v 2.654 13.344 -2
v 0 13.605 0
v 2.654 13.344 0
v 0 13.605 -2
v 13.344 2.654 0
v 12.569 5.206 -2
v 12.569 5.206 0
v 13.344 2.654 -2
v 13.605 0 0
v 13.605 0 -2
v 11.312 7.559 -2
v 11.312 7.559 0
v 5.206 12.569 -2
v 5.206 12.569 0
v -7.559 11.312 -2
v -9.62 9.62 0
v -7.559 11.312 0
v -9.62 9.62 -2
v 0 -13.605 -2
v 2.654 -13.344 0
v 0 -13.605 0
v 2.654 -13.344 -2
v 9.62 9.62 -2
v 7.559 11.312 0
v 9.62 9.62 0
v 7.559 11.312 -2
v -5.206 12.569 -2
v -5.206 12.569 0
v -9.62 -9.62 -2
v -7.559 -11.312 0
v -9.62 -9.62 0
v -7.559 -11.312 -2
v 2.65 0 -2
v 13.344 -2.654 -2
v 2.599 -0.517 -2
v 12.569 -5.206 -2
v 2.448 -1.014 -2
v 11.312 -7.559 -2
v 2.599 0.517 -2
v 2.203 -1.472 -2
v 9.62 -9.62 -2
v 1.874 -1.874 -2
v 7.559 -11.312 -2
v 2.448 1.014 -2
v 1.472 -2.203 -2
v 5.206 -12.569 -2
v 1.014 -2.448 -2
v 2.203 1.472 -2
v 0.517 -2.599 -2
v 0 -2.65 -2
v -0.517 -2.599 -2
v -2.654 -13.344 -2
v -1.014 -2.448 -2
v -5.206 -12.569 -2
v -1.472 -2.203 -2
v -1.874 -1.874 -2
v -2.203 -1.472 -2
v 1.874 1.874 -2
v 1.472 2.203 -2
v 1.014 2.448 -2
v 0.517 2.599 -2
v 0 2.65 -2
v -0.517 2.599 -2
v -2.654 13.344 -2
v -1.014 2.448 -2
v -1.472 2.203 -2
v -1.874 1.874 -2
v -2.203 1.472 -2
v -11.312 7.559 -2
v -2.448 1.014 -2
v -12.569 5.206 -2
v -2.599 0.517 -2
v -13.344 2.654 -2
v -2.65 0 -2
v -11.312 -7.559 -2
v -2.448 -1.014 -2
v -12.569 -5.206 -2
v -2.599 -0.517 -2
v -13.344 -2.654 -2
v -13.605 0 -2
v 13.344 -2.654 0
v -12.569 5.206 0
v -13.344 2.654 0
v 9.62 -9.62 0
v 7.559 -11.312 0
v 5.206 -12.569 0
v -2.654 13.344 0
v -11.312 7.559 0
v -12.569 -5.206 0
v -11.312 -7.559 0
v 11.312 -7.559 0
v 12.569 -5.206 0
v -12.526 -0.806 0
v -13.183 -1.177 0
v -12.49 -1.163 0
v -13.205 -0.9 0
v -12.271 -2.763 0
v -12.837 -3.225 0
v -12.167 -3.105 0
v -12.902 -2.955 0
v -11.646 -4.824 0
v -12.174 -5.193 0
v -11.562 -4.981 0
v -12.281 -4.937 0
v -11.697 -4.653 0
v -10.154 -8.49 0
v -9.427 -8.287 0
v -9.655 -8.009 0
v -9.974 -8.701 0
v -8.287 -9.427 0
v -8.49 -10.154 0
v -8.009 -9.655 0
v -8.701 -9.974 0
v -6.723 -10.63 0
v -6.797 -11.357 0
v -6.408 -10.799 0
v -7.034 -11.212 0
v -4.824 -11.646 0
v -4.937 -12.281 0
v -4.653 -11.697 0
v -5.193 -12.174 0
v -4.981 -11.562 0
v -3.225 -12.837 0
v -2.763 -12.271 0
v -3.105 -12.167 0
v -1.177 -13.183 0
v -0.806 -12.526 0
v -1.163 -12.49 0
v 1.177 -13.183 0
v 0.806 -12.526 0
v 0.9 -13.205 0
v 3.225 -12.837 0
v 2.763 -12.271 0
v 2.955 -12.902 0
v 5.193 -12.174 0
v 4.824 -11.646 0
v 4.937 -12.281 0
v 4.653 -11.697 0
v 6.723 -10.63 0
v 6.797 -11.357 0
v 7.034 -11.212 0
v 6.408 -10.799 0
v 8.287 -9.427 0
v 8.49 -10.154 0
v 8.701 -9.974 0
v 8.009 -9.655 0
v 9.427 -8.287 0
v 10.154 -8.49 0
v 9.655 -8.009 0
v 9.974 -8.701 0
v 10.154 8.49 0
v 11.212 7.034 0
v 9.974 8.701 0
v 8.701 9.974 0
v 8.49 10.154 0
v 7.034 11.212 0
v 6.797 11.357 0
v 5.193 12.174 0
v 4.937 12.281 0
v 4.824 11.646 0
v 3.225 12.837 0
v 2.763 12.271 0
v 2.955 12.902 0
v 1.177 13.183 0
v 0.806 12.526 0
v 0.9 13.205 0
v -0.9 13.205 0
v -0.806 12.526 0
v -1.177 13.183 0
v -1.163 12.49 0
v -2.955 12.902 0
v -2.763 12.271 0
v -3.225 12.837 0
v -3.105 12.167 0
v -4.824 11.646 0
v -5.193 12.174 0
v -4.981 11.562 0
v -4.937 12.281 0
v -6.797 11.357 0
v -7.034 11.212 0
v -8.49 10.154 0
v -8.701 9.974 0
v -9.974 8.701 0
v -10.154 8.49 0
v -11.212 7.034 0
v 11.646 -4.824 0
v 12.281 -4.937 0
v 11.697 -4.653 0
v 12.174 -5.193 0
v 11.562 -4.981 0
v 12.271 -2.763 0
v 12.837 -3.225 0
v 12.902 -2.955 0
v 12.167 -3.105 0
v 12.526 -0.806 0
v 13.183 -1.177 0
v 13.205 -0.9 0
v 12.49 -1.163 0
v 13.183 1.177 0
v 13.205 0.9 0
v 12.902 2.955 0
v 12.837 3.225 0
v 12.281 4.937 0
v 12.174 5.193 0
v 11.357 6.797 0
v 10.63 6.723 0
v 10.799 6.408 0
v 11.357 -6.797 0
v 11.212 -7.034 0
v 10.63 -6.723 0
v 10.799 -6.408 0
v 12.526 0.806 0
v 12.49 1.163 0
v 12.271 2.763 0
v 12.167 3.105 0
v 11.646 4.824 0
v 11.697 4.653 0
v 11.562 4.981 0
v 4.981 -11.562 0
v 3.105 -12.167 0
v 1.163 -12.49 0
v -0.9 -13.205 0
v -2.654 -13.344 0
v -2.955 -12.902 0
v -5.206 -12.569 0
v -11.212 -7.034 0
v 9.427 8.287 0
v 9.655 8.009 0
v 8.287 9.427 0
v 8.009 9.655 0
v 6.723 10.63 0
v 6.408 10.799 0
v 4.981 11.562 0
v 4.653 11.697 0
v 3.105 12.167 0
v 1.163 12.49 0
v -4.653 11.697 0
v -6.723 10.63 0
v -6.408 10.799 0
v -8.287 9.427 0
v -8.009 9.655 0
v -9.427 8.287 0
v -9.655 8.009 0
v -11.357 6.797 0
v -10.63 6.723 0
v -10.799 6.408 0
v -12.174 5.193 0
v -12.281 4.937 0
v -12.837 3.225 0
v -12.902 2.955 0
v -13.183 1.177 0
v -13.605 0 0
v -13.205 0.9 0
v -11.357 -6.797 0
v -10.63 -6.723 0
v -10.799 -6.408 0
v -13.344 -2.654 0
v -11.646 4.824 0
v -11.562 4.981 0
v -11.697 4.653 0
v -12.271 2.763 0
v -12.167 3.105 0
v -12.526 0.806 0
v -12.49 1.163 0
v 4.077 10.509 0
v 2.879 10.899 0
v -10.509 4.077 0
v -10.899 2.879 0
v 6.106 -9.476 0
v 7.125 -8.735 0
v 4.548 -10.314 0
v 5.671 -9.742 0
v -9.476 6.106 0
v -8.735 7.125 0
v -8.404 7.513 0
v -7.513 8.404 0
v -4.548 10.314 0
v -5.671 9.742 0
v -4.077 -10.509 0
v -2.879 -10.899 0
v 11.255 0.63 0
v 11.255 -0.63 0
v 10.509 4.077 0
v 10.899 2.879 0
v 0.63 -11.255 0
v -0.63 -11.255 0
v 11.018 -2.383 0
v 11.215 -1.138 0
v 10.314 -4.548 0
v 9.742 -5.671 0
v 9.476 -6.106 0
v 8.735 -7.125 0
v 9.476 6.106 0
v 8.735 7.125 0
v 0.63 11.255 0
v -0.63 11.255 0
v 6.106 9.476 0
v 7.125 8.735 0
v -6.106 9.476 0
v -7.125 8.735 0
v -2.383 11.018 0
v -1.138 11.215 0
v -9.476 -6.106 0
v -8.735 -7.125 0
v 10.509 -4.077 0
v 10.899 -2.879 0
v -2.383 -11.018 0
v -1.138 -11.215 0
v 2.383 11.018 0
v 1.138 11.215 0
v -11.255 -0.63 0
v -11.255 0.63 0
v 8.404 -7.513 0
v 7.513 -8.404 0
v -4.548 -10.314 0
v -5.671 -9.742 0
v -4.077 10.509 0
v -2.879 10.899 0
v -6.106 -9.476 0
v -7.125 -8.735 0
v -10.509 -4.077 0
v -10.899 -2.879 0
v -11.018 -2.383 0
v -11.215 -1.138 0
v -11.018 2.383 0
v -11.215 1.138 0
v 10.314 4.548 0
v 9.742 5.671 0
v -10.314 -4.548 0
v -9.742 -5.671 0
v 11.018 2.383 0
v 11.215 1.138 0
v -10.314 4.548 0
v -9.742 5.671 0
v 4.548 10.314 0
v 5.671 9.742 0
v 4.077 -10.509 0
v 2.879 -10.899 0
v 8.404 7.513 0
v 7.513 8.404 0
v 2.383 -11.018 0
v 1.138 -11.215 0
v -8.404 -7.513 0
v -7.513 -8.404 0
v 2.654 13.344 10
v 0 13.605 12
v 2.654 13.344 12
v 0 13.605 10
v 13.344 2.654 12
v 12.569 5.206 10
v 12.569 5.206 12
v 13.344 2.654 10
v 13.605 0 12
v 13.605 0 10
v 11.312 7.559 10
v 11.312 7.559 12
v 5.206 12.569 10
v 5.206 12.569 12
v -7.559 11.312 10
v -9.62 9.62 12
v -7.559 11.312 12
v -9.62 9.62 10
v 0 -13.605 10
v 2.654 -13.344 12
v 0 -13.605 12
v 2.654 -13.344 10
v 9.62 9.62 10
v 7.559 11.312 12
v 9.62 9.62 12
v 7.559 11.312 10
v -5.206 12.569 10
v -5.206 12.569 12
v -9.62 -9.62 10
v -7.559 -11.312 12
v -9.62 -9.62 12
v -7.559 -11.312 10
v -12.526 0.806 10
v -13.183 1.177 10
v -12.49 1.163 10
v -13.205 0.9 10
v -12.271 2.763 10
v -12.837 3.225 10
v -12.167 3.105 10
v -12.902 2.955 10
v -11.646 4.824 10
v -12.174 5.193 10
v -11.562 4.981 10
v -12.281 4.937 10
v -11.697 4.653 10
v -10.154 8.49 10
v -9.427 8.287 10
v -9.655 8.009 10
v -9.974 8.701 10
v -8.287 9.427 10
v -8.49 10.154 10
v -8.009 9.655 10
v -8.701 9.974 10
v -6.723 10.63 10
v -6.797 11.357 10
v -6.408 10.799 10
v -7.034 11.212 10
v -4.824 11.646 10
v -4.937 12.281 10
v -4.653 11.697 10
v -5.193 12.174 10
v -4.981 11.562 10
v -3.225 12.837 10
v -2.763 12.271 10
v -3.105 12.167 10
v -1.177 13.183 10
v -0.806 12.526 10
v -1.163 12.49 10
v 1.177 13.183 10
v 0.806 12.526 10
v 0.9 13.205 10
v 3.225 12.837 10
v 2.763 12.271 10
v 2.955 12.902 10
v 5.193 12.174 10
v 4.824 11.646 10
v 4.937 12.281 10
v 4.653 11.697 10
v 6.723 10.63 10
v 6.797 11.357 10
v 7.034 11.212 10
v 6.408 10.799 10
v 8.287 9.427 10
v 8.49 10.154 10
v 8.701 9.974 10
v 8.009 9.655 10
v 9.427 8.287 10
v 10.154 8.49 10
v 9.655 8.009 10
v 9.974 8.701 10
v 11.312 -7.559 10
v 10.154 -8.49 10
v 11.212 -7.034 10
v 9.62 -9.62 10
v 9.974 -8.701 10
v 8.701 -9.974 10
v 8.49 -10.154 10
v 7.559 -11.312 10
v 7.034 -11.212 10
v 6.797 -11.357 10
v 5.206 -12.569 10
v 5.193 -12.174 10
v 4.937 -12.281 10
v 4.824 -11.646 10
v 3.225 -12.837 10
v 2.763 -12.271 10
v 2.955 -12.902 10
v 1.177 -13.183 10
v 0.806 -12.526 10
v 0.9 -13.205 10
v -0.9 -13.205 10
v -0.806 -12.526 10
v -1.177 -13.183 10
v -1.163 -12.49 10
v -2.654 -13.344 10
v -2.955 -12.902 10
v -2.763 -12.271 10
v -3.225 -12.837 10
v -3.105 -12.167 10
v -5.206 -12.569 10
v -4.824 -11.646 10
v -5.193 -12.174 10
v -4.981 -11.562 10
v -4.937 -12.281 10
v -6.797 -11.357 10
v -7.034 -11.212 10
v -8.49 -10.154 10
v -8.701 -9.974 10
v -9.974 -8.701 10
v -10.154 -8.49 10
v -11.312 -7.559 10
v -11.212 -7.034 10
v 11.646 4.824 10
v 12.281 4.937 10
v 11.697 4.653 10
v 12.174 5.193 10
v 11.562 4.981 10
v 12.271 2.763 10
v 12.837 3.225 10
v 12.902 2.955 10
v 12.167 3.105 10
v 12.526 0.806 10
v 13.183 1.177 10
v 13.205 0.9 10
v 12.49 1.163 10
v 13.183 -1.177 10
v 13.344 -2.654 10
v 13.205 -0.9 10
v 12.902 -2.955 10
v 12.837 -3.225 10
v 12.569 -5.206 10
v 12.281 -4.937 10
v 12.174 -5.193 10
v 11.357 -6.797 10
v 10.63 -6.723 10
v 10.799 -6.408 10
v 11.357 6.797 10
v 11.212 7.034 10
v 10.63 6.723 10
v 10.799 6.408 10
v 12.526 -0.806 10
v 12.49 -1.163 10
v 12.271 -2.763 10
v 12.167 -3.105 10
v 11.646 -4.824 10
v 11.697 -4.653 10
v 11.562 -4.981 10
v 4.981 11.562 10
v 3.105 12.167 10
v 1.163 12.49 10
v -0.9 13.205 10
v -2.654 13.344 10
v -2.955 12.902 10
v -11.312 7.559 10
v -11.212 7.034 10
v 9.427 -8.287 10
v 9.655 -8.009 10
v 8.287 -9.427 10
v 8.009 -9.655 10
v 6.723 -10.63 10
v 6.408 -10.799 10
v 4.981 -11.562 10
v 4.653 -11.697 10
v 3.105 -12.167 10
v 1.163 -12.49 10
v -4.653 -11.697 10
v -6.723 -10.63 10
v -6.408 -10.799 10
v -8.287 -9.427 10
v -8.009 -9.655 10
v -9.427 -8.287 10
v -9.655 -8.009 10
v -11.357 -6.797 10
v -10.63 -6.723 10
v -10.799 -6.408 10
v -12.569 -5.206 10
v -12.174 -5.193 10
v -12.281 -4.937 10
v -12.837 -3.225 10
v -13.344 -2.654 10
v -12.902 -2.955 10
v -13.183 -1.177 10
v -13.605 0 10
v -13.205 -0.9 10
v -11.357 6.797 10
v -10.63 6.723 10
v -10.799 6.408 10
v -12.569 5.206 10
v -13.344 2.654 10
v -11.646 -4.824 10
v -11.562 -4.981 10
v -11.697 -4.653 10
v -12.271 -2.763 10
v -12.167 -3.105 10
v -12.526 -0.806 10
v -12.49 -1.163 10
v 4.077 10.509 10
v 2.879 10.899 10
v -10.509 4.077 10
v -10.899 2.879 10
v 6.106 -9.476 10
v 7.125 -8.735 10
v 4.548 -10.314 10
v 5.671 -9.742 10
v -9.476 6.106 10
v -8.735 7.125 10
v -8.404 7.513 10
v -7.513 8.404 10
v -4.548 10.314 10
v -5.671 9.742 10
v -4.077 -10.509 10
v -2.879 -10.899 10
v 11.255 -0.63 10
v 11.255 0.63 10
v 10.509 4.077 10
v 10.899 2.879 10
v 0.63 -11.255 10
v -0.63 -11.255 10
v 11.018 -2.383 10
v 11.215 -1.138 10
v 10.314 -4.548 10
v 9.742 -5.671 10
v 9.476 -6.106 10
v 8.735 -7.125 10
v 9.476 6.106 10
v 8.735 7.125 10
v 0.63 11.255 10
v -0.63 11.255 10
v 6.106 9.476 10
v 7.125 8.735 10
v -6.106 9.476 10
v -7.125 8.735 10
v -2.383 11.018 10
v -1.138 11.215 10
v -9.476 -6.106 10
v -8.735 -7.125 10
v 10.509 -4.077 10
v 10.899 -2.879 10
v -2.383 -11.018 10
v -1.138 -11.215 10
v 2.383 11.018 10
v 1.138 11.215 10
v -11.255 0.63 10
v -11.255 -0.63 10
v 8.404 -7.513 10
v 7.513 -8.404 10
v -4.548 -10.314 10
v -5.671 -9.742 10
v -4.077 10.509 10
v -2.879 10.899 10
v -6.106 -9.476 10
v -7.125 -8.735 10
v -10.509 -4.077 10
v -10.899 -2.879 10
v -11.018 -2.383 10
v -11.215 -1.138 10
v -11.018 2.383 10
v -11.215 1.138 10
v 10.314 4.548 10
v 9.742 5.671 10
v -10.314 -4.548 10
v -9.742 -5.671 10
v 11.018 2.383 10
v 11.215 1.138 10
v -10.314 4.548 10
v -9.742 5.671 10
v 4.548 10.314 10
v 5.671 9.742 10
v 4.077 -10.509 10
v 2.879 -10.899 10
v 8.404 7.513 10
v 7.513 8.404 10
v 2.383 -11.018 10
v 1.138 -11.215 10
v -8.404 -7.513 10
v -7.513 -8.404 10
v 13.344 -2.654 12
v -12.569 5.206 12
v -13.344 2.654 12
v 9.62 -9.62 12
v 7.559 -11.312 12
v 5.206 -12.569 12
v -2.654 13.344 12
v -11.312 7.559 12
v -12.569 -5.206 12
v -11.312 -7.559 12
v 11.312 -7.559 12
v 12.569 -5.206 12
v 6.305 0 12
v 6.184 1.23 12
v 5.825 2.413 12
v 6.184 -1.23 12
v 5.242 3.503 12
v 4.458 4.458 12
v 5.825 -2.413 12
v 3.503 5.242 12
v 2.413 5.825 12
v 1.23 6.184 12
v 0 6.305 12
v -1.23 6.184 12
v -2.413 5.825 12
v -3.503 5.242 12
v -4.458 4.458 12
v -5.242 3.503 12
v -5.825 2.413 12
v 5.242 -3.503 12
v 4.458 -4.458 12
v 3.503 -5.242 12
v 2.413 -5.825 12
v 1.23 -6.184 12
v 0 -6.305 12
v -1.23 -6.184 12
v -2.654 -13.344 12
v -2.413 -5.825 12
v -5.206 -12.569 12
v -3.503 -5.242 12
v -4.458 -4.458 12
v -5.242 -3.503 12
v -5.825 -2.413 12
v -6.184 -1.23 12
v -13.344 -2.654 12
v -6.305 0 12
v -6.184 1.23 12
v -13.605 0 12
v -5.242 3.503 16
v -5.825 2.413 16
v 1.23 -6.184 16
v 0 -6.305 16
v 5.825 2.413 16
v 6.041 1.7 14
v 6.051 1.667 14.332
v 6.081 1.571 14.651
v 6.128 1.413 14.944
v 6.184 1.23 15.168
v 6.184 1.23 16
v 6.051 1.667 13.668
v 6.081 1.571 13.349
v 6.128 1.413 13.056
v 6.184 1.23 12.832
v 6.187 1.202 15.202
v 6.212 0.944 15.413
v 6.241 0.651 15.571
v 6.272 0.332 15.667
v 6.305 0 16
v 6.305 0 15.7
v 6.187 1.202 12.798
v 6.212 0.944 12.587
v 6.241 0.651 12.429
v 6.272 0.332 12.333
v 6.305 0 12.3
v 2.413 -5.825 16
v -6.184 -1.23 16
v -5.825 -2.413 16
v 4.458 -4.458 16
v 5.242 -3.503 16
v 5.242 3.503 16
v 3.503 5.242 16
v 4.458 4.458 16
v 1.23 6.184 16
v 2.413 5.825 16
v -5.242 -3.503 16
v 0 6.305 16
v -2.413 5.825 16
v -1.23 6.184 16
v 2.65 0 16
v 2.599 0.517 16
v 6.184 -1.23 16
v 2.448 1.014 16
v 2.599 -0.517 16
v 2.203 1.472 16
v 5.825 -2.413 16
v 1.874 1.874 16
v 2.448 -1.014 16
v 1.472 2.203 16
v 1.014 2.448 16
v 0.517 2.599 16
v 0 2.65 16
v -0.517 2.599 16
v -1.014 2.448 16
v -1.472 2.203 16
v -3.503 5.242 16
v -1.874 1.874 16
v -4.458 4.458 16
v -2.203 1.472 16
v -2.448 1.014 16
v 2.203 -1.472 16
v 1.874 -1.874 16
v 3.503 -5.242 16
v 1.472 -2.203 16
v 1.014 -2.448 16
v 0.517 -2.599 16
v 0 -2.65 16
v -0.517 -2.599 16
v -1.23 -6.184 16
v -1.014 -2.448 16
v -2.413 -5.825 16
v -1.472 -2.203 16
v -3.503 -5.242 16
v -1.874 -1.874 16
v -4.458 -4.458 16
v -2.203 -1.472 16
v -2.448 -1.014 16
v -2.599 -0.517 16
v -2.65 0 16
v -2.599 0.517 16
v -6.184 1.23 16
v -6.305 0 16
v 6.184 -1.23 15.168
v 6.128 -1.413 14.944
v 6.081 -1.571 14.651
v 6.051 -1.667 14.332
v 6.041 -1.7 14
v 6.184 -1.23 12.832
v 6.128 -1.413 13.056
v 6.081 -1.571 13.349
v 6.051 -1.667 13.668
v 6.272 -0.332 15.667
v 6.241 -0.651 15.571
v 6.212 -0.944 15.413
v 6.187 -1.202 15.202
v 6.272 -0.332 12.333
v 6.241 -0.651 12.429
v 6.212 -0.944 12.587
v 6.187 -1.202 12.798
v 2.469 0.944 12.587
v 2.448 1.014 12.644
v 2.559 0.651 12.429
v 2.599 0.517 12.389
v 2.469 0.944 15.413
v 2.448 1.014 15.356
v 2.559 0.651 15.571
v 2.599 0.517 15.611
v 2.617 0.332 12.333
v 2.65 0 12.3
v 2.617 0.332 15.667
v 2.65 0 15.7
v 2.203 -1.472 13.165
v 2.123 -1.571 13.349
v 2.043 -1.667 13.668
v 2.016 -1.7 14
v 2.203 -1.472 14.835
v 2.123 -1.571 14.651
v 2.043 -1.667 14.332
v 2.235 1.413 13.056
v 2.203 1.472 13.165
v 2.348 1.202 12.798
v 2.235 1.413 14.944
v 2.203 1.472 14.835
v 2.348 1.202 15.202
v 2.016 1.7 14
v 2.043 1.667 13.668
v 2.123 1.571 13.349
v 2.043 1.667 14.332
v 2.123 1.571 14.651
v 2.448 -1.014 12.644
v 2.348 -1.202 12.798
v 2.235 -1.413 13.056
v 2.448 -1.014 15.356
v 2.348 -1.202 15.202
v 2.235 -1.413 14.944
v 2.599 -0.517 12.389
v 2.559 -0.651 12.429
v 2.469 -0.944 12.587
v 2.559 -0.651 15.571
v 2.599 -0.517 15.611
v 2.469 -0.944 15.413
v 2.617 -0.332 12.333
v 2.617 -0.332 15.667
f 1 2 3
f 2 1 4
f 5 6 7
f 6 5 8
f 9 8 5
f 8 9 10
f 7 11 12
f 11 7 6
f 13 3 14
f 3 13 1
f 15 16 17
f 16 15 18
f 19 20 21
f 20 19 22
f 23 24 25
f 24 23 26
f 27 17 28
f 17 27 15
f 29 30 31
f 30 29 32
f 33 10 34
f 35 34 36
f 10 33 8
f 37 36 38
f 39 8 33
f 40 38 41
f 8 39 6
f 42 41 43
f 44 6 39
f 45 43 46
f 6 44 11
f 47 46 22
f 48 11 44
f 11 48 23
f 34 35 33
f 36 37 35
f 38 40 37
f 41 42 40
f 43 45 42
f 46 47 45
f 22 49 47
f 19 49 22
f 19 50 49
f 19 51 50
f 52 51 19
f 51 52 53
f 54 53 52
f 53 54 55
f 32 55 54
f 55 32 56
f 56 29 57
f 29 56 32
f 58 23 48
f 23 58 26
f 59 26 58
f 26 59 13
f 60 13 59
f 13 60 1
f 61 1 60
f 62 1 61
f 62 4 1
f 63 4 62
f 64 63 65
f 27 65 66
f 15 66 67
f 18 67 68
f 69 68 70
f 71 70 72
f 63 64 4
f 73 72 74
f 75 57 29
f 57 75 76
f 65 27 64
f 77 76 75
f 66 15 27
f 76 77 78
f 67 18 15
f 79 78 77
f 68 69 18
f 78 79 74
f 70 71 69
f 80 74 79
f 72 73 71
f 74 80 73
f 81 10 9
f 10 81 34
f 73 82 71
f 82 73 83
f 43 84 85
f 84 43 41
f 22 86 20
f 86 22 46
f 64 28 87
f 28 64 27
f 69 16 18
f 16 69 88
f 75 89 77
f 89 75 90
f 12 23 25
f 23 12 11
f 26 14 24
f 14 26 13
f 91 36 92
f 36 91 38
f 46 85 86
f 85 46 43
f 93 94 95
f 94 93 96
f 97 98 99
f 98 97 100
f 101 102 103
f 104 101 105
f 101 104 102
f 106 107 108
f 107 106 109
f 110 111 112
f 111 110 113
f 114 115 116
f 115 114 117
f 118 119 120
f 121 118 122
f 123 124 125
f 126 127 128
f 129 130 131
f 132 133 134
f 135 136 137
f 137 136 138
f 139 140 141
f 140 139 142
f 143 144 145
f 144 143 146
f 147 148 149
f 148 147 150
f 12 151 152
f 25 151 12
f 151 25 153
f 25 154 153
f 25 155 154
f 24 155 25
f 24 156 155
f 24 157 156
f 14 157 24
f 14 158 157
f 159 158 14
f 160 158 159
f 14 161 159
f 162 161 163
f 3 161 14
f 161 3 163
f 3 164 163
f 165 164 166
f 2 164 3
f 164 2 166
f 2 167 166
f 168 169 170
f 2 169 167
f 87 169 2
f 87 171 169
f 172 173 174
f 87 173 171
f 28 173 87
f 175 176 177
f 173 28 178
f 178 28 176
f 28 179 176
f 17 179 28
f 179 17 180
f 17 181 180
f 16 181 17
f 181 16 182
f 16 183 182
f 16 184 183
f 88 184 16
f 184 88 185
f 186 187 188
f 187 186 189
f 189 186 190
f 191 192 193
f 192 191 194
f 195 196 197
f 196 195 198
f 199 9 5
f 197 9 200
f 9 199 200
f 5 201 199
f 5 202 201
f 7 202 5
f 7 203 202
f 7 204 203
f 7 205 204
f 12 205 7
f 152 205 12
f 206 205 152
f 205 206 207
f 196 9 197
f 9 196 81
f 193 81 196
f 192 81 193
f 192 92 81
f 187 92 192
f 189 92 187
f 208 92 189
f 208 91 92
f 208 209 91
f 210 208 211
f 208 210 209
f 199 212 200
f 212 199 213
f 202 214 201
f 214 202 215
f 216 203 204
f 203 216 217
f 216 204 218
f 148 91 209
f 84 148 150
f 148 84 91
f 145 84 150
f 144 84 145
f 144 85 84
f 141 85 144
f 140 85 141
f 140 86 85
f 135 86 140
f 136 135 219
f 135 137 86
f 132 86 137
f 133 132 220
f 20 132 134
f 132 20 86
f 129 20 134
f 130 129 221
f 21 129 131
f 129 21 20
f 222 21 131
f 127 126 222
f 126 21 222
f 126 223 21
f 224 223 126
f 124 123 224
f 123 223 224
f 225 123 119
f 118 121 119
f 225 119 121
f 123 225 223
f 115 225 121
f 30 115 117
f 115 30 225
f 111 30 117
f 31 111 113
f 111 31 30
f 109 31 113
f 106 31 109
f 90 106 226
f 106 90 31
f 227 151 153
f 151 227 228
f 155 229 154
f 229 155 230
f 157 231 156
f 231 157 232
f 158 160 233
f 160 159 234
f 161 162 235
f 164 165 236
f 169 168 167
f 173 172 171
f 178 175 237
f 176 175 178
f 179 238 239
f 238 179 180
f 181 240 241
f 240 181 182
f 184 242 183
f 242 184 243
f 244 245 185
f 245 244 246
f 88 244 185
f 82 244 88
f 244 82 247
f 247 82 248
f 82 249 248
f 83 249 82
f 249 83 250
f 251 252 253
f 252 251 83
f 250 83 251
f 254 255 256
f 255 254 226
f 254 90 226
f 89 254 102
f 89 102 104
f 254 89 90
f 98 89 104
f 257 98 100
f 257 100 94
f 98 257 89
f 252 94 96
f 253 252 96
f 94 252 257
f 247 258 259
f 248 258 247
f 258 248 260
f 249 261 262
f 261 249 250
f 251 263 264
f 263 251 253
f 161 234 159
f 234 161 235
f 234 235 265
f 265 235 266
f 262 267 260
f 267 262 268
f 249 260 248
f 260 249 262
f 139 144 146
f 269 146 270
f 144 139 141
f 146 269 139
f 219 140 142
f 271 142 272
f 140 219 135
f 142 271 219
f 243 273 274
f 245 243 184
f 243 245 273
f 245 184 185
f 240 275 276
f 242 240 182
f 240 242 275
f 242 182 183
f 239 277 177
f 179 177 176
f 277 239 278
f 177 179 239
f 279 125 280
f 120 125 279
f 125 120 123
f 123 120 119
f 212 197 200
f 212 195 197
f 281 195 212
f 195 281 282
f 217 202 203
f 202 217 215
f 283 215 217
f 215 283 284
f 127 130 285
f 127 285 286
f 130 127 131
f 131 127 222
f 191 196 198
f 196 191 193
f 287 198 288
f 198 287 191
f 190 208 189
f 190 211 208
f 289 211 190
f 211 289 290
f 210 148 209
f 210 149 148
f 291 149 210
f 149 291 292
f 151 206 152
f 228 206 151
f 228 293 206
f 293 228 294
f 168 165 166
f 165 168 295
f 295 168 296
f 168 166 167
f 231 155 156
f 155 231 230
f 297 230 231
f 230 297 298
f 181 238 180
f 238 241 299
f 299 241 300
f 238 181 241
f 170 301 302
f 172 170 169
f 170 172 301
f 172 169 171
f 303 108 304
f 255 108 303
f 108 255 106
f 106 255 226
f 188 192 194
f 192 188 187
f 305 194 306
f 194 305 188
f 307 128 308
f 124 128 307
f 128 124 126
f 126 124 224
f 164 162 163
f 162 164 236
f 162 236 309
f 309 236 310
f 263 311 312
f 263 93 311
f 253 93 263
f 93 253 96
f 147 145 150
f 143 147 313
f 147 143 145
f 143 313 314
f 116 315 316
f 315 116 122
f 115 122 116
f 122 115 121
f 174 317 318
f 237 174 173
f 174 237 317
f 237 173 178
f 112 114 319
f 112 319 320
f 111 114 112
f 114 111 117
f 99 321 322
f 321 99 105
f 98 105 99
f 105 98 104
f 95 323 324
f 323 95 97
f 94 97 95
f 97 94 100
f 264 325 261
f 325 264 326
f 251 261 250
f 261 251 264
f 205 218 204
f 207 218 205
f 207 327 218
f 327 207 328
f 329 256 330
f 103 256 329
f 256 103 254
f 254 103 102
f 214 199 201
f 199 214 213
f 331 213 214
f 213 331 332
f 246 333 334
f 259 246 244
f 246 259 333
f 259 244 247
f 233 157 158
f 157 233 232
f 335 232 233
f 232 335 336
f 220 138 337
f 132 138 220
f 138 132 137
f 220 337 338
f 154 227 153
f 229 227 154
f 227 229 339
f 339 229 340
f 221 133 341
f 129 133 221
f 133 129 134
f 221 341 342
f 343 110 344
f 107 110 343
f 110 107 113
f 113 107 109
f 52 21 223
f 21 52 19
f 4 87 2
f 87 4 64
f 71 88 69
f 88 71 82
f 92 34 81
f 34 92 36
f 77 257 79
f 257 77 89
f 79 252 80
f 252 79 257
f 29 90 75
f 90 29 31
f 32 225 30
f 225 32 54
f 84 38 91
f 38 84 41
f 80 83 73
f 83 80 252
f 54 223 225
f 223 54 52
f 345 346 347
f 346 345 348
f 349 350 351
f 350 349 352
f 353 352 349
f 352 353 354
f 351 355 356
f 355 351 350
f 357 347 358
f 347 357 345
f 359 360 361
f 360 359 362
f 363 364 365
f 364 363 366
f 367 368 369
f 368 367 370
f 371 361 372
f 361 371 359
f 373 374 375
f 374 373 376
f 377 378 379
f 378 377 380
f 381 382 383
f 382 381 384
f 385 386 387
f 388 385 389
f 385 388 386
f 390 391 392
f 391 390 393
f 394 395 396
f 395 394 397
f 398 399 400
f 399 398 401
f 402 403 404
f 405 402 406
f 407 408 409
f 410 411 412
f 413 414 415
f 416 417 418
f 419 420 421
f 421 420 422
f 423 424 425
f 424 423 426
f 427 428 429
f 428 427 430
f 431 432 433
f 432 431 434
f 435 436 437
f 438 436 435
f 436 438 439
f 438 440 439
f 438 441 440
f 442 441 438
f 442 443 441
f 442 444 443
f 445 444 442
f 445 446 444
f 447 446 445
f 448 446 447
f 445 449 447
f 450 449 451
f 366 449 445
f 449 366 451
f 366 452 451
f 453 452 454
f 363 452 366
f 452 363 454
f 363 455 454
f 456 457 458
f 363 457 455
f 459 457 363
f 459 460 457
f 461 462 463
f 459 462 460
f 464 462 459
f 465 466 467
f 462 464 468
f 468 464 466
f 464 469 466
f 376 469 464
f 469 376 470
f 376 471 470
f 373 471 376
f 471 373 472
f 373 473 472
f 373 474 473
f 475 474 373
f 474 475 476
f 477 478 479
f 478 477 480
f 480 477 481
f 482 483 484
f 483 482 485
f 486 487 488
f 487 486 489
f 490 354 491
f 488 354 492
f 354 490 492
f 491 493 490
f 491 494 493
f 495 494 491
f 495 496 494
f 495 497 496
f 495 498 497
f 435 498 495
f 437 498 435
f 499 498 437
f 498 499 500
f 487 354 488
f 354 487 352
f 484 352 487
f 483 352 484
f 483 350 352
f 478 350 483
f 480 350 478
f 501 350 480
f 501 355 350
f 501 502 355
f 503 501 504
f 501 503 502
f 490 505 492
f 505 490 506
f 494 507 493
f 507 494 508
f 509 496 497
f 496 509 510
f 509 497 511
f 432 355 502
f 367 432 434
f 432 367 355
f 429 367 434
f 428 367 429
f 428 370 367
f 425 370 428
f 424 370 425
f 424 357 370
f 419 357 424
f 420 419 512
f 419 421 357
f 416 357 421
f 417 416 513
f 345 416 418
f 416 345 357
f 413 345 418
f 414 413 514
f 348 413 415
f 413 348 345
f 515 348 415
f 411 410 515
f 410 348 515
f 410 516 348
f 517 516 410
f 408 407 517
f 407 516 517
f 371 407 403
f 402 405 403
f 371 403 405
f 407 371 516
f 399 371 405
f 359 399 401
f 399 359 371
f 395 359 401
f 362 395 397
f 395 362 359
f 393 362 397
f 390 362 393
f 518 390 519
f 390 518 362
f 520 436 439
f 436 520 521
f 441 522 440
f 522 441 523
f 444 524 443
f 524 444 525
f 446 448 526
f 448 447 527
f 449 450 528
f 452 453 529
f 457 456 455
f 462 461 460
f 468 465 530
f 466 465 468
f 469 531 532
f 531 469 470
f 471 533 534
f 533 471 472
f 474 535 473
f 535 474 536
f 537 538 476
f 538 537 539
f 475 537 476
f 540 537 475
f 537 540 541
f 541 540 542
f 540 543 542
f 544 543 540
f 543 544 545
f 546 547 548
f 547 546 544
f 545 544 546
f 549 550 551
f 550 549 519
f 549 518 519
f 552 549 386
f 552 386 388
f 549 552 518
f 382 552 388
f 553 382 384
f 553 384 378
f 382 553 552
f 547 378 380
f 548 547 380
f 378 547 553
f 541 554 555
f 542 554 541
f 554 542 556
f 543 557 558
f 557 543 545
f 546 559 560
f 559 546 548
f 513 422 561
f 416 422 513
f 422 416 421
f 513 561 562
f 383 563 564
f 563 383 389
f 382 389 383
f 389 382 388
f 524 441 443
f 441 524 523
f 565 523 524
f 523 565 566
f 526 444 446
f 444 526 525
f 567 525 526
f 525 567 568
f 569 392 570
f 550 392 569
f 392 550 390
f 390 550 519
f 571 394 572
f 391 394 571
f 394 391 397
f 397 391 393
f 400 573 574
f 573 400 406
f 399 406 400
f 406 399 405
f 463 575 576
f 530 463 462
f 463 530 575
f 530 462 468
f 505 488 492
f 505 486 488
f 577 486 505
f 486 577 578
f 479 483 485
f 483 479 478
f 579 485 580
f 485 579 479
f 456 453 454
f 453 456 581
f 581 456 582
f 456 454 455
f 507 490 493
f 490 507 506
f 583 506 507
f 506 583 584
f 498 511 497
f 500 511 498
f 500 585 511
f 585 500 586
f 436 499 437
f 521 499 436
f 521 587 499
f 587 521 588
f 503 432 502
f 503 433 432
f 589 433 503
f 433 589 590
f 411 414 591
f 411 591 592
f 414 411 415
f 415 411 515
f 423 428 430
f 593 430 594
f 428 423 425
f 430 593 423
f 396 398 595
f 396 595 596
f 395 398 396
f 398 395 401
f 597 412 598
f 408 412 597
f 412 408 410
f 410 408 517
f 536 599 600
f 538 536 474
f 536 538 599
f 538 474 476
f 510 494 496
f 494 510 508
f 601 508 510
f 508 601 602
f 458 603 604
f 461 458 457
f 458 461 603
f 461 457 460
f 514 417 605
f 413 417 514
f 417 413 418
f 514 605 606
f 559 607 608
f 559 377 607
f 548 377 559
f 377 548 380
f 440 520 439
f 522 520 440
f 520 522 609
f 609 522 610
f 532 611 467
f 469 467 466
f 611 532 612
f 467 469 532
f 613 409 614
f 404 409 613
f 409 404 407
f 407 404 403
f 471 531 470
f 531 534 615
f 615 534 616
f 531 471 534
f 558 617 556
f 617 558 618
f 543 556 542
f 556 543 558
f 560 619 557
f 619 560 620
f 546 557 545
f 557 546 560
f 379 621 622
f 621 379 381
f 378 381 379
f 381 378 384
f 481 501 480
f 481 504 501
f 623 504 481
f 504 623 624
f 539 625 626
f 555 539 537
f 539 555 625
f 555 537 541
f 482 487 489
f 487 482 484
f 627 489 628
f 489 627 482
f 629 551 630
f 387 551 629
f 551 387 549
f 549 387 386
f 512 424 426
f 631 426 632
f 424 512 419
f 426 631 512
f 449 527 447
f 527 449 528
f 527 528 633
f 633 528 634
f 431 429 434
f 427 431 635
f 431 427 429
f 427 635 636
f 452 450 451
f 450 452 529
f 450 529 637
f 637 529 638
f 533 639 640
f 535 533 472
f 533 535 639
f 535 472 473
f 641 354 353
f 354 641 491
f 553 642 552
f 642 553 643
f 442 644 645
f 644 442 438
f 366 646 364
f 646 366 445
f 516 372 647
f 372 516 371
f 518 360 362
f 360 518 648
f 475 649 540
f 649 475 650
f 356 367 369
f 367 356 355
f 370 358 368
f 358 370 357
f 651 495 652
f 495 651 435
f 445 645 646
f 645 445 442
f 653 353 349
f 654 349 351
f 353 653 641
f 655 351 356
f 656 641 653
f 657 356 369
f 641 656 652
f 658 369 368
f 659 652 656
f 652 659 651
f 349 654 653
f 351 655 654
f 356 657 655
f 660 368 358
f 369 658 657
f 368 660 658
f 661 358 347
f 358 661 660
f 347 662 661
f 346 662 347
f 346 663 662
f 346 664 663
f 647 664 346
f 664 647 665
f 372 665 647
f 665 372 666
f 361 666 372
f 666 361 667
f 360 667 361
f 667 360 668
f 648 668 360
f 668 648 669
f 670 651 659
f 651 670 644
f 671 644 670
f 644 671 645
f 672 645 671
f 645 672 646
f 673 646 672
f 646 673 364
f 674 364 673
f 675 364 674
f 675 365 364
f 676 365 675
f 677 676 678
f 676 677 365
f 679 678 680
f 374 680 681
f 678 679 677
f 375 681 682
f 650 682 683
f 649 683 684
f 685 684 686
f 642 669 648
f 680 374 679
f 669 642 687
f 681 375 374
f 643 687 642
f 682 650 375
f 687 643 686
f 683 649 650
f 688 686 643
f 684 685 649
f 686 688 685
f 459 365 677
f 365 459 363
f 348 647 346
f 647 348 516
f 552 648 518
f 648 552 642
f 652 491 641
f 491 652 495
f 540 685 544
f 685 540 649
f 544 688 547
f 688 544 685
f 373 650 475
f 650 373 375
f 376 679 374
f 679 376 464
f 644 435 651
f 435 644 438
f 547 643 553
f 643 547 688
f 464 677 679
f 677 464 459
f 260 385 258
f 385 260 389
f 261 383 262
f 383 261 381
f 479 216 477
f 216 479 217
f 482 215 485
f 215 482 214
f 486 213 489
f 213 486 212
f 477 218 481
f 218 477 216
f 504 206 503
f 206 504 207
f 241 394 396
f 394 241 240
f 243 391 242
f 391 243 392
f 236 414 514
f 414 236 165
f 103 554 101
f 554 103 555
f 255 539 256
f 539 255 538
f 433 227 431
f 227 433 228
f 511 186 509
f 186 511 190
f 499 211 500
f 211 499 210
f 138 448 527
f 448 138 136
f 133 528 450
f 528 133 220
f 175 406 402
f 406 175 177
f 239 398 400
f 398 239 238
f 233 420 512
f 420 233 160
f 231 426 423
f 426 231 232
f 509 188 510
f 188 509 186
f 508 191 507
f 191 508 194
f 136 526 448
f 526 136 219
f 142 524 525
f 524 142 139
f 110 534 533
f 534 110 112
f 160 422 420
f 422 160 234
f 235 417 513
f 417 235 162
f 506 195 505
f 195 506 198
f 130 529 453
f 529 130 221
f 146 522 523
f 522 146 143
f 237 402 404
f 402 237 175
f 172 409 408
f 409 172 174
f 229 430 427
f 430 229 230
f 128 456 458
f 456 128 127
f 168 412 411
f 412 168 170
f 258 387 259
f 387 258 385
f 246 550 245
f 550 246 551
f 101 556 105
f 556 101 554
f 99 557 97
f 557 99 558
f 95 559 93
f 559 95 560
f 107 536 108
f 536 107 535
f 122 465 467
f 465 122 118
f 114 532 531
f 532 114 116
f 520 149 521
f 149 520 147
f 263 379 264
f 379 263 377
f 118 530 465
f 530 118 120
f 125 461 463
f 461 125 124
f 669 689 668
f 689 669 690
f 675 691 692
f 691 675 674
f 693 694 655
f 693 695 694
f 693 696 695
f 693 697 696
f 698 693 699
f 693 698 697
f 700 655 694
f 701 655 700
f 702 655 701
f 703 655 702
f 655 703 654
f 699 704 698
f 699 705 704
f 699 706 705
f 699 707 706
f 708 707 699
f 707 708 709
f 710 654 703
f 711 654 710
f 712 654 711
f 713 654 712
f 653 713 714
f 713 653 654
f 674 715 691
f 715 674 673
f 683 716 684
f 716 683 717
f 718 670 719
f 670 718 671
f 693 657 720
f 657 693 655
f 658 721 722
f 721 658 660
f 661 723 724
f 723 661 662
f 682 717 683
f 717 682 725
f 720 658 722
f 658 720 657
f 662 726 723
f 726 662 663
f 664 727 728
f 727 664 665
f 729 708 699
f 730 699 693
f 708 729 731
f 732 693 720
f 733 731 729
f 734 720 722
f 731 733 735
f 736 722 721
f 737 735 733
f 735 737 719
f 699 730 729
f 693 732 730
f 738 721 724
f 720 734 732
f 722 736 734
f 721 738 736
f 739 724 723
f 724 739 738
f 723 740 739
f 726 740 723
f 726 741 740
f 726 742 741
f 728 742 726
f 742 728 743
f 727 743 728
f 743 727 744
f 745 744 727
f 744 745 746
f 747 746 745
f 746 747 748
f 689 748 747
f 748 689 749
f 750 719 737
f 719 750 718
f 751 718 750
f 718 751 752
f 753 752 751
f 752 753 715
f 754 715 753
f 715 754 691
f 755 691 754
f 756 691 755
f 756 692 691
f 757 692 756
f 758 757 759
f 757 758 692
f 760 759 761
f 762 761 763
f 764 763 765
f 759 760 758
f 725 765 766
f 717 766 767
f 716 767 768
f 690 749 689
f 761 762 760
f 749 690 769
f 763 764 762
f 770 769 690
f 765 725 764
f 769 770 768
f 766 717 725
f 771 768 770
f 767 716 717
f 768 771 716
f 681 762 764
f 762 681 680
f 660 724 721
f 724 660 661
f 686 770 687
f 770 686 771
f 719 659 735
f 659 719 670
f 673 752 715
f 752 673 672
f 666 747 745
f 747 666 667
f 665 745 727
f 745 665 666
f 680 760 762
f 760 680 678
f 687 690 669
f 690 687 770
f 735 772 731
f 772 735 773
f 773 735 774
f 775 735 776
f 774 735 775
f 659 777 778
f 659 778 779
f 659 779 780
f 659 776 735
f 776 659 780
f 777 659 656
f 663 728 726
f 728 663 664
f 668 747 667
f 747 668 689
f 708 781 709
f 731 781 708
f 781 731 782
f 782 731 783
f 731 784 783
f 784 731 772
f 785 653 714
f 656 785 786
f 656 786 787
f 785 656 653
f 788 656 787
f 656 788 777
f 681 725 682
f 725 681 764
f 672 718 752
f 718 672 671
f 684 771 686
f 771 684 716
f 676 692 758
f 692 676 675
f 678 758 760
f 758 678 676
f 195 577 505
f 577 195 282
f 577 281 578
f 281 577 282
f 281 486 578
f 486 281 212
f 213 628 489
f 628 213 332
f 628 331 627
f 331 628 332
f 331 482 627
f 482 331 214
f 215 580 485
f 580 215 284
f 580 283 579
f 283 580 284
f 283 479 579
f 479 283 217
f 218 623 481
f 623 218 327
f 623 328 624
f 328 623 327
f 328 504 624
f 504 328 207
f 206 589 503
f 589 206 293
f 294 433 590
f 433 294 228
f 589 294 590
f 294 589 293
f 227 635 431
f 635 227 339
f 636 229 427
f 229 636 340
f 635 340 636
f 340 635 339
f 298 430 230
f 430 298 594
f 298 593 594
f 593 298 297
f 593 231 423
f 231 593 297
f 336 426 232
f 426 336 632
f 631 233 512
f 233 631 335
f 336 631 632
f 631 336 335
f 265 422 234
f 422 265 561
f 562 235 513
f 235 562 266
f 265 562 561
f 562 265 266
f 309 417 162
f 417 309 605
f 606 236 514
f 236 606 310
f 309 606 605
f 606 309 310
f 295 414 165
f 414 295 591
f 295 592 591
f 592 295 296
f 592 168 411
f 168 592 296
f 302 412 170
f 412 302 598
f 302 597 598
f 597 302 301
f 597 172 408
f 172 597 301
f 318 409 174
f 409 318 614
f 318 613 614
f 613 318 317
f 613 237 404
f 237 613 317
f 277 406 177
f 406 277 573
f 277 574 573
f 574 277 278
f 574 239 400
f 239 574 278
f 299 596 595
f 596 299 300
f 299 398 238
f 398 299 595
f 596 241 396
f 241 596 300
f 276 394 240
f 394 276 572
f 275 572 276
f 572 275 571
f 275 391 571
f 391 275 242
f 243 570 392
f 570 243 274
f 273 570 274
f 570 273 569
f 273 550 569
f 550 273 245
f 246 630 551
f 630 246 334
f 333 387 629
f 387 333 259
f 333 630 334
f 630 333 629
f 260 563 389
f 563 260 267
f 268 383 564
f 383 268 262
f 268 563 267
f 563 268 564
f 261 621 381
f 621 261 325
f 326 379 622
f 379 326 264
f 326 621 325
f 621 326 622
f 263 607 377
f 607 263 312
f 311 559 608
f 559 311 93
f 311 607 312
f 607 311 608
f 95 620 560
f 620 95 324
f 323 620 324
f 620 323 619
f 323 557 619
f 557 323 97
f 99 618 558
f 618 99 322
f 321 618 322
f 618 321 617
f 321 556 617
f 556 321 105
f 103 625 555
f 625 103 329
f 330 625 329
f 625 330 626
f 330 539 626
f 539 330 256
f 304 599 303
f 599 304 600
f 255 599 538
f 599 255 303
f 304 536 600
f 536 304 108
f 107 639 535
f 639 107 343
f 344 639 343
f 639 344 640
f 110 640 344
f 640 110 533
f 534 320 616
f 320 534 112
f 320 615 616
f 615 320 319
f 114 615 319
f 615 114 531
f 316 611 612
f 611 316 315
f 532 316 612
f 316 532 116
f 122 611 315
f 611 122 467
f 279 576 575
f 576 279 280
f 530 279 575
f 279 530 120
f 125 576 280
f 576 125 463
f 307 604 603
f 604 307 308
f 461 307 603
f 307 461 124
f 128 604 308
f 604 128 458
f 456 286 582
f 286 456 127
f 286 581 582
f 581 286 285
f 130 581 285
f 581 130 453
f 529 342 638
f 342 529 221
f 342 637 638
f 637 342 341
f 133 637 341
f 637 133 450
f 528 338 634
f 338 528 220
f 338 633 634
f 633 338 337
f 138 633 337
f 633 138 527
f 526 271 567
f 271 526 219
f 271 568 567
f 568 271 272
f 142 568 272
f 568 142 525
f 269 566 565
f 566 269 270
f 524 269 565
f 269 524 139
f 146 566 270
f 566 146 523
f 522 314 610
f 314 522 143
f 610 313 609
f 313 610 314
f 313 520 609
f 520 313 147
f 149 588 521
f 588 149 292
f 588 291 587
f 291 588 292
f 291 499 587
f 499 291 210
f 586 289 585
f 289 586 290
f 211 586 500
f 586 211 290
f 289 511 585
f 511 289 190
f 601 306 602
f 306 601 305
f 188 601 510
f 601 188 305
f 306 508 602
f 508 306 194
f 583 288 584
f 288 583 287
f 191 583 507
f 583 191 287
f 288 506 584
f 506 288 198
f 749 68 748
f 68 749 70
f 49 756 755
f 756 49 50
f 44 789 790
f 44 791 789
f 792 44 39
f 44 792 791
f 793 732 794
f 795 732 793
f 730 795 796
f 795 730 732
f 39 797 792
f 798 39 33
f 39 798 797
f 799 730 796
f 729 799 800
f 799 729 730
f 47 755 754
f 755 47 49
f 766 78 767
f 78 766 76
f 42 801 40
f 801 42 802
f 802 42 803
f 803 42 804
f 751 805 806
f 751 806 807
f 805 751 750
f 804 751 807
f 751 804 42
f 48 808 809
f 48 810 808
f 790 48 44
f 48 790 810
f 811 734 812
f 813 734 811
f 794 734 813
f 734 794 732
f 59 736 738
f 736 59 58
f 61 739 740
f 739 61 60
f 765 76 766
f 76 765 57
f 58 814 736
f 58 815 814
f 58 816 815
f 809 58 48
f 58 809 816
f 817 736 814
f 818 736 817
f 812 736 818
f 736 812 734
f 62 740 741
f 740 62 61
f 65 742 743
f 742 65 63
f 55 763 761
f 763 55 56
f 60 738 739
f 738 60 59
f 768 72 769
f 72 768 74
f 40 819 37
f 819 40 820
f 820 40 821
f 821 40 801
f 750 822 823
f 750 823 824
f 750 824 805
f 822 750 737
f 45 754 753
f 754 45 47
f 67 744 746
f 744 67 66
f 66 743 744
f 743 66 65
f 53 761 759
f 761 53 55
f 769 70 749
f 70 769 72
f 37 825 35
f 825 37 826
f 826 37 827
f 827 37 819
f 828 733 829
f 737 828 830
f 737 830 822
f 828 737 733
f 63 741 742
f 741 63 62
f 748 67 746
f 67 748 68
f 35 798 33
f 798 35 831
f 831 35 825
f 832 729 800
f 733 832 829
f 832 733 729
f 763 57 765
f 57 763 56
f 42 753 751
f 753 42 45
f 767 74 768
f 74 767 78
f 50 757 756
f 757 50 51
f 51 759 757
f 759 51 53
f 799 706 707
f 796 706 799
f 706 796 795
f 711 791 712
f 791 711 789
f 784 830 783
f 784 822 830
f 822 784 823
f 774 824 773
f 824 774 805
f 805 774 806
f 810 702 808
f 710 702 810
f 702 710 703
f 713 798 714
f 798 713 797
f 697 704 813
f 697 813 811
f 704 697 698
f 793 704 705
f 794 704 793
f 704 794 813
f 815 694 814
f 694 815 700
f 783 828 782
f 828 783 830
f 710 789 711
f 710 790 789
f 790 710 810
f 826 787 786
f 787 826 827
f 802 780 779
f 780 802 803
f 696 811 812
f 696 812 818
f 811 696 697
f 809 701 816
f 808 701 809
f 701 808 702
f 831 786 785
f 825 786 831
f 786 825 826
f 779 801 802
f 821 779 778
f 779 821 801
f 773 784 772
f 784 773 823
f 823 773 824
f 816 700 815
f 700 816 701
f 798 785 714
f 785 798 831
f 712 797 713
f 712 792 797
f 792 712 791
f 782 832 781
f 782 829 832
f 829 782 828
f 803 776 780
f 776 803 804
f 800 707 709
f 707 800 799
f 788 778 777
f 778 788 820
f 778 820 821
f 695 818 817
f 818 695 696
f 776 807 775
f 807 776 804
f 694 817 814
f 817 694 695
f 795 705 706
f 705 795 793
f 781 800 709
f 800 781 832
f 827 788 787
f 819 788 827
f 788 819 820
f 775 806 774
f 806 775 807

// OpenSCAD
$fn = 32;

// ----------------------------------------------------------------------
// Timing pulley: GT2 40T, pitch 2 mm, 27.21 mm x 18 mm
// ----------------------------------------------------------------------

// --- parameters (mm) ---
belt_pitch = 2;           // belt pitch
n_teeth = 40;             // number of grooves
rim_w = 10;               // belt width between the flanges
tip_d = 25.21;            // tip circle diameter
root_d = 23.71;           // groove bottom diameter
groove_h = 0.75;          // groove depth
tooth_w = 1.5;            // groove width at the tip circle
rim_d = 27.21;            // flange diameter
rim_t = 2;                // flange thickness
spigot_d = 22.11;         // flange spigot, sunk into the rim
spigot_h = 1.2;           // spigot depth into the rim
shaft_d = 5.3;            // shaft bore
hub_d = 12.61;            // hub diameter
hub_h = 4;                // hub above the flange
bottom_z = -2;            // lowest point of the pulley
top_z = 16;               // highest point of the pulley
set_d = 3.4;              // set screw tap hole

module rim() {
  cylinder(h = rim_w, d = tip_d);
}

module groove_cutter() {
  /* belt tooth groove: deeper than wide, cut through the belt width */
  translate([root_d / 2, 0, 0])
    linear_extrude(height = rim_w)
      polygon(points = [[-0.6, -tooth_w * 0.42], [groove_h + 0.6, -tooth_w * 0.6],
                        [groove_h + 0.6, tooth_w * 0.6], [-0.6, tooth_w * 0.42]]);
}

module flanges() {
  translate([0, 0, -rim_t]) cylinder(h = rim_t, d = rim_d);
  translate([0, 0, rim_w]) cylinder(h = rim_t, d = rim_d);
  translate([0, 0, -spigot_h]) cylinder(h = spigot_h + 0.6, d = spigot_d);
  translate([0, 0, rim_w - 0.6]) cylinder(h = spigot_h + 0.6, d = spigot_d);
}

module hub() {
  translate([0, 0, bottom_z]) cylinder(h = top_z - bottom_z, d = hub_d);
}

difference() {
  union() {
    rim();
    hub();
    flanges();
  }
  for (i = [0 : n_teeth - 1]) rotate([0, 0, i * 360 / n_teeth]) groove_cutter();
  translate([0, 0, bottom_z - 1]) cylinder(h = top_z - bottom_z + 2, d = shaft_d);
  translate([-1, 0, top_z - hub_h * 0.5]) rotate([0, 90, 0]) cylinder(h = hub_d / 2 + 3, d = set_d);
}
